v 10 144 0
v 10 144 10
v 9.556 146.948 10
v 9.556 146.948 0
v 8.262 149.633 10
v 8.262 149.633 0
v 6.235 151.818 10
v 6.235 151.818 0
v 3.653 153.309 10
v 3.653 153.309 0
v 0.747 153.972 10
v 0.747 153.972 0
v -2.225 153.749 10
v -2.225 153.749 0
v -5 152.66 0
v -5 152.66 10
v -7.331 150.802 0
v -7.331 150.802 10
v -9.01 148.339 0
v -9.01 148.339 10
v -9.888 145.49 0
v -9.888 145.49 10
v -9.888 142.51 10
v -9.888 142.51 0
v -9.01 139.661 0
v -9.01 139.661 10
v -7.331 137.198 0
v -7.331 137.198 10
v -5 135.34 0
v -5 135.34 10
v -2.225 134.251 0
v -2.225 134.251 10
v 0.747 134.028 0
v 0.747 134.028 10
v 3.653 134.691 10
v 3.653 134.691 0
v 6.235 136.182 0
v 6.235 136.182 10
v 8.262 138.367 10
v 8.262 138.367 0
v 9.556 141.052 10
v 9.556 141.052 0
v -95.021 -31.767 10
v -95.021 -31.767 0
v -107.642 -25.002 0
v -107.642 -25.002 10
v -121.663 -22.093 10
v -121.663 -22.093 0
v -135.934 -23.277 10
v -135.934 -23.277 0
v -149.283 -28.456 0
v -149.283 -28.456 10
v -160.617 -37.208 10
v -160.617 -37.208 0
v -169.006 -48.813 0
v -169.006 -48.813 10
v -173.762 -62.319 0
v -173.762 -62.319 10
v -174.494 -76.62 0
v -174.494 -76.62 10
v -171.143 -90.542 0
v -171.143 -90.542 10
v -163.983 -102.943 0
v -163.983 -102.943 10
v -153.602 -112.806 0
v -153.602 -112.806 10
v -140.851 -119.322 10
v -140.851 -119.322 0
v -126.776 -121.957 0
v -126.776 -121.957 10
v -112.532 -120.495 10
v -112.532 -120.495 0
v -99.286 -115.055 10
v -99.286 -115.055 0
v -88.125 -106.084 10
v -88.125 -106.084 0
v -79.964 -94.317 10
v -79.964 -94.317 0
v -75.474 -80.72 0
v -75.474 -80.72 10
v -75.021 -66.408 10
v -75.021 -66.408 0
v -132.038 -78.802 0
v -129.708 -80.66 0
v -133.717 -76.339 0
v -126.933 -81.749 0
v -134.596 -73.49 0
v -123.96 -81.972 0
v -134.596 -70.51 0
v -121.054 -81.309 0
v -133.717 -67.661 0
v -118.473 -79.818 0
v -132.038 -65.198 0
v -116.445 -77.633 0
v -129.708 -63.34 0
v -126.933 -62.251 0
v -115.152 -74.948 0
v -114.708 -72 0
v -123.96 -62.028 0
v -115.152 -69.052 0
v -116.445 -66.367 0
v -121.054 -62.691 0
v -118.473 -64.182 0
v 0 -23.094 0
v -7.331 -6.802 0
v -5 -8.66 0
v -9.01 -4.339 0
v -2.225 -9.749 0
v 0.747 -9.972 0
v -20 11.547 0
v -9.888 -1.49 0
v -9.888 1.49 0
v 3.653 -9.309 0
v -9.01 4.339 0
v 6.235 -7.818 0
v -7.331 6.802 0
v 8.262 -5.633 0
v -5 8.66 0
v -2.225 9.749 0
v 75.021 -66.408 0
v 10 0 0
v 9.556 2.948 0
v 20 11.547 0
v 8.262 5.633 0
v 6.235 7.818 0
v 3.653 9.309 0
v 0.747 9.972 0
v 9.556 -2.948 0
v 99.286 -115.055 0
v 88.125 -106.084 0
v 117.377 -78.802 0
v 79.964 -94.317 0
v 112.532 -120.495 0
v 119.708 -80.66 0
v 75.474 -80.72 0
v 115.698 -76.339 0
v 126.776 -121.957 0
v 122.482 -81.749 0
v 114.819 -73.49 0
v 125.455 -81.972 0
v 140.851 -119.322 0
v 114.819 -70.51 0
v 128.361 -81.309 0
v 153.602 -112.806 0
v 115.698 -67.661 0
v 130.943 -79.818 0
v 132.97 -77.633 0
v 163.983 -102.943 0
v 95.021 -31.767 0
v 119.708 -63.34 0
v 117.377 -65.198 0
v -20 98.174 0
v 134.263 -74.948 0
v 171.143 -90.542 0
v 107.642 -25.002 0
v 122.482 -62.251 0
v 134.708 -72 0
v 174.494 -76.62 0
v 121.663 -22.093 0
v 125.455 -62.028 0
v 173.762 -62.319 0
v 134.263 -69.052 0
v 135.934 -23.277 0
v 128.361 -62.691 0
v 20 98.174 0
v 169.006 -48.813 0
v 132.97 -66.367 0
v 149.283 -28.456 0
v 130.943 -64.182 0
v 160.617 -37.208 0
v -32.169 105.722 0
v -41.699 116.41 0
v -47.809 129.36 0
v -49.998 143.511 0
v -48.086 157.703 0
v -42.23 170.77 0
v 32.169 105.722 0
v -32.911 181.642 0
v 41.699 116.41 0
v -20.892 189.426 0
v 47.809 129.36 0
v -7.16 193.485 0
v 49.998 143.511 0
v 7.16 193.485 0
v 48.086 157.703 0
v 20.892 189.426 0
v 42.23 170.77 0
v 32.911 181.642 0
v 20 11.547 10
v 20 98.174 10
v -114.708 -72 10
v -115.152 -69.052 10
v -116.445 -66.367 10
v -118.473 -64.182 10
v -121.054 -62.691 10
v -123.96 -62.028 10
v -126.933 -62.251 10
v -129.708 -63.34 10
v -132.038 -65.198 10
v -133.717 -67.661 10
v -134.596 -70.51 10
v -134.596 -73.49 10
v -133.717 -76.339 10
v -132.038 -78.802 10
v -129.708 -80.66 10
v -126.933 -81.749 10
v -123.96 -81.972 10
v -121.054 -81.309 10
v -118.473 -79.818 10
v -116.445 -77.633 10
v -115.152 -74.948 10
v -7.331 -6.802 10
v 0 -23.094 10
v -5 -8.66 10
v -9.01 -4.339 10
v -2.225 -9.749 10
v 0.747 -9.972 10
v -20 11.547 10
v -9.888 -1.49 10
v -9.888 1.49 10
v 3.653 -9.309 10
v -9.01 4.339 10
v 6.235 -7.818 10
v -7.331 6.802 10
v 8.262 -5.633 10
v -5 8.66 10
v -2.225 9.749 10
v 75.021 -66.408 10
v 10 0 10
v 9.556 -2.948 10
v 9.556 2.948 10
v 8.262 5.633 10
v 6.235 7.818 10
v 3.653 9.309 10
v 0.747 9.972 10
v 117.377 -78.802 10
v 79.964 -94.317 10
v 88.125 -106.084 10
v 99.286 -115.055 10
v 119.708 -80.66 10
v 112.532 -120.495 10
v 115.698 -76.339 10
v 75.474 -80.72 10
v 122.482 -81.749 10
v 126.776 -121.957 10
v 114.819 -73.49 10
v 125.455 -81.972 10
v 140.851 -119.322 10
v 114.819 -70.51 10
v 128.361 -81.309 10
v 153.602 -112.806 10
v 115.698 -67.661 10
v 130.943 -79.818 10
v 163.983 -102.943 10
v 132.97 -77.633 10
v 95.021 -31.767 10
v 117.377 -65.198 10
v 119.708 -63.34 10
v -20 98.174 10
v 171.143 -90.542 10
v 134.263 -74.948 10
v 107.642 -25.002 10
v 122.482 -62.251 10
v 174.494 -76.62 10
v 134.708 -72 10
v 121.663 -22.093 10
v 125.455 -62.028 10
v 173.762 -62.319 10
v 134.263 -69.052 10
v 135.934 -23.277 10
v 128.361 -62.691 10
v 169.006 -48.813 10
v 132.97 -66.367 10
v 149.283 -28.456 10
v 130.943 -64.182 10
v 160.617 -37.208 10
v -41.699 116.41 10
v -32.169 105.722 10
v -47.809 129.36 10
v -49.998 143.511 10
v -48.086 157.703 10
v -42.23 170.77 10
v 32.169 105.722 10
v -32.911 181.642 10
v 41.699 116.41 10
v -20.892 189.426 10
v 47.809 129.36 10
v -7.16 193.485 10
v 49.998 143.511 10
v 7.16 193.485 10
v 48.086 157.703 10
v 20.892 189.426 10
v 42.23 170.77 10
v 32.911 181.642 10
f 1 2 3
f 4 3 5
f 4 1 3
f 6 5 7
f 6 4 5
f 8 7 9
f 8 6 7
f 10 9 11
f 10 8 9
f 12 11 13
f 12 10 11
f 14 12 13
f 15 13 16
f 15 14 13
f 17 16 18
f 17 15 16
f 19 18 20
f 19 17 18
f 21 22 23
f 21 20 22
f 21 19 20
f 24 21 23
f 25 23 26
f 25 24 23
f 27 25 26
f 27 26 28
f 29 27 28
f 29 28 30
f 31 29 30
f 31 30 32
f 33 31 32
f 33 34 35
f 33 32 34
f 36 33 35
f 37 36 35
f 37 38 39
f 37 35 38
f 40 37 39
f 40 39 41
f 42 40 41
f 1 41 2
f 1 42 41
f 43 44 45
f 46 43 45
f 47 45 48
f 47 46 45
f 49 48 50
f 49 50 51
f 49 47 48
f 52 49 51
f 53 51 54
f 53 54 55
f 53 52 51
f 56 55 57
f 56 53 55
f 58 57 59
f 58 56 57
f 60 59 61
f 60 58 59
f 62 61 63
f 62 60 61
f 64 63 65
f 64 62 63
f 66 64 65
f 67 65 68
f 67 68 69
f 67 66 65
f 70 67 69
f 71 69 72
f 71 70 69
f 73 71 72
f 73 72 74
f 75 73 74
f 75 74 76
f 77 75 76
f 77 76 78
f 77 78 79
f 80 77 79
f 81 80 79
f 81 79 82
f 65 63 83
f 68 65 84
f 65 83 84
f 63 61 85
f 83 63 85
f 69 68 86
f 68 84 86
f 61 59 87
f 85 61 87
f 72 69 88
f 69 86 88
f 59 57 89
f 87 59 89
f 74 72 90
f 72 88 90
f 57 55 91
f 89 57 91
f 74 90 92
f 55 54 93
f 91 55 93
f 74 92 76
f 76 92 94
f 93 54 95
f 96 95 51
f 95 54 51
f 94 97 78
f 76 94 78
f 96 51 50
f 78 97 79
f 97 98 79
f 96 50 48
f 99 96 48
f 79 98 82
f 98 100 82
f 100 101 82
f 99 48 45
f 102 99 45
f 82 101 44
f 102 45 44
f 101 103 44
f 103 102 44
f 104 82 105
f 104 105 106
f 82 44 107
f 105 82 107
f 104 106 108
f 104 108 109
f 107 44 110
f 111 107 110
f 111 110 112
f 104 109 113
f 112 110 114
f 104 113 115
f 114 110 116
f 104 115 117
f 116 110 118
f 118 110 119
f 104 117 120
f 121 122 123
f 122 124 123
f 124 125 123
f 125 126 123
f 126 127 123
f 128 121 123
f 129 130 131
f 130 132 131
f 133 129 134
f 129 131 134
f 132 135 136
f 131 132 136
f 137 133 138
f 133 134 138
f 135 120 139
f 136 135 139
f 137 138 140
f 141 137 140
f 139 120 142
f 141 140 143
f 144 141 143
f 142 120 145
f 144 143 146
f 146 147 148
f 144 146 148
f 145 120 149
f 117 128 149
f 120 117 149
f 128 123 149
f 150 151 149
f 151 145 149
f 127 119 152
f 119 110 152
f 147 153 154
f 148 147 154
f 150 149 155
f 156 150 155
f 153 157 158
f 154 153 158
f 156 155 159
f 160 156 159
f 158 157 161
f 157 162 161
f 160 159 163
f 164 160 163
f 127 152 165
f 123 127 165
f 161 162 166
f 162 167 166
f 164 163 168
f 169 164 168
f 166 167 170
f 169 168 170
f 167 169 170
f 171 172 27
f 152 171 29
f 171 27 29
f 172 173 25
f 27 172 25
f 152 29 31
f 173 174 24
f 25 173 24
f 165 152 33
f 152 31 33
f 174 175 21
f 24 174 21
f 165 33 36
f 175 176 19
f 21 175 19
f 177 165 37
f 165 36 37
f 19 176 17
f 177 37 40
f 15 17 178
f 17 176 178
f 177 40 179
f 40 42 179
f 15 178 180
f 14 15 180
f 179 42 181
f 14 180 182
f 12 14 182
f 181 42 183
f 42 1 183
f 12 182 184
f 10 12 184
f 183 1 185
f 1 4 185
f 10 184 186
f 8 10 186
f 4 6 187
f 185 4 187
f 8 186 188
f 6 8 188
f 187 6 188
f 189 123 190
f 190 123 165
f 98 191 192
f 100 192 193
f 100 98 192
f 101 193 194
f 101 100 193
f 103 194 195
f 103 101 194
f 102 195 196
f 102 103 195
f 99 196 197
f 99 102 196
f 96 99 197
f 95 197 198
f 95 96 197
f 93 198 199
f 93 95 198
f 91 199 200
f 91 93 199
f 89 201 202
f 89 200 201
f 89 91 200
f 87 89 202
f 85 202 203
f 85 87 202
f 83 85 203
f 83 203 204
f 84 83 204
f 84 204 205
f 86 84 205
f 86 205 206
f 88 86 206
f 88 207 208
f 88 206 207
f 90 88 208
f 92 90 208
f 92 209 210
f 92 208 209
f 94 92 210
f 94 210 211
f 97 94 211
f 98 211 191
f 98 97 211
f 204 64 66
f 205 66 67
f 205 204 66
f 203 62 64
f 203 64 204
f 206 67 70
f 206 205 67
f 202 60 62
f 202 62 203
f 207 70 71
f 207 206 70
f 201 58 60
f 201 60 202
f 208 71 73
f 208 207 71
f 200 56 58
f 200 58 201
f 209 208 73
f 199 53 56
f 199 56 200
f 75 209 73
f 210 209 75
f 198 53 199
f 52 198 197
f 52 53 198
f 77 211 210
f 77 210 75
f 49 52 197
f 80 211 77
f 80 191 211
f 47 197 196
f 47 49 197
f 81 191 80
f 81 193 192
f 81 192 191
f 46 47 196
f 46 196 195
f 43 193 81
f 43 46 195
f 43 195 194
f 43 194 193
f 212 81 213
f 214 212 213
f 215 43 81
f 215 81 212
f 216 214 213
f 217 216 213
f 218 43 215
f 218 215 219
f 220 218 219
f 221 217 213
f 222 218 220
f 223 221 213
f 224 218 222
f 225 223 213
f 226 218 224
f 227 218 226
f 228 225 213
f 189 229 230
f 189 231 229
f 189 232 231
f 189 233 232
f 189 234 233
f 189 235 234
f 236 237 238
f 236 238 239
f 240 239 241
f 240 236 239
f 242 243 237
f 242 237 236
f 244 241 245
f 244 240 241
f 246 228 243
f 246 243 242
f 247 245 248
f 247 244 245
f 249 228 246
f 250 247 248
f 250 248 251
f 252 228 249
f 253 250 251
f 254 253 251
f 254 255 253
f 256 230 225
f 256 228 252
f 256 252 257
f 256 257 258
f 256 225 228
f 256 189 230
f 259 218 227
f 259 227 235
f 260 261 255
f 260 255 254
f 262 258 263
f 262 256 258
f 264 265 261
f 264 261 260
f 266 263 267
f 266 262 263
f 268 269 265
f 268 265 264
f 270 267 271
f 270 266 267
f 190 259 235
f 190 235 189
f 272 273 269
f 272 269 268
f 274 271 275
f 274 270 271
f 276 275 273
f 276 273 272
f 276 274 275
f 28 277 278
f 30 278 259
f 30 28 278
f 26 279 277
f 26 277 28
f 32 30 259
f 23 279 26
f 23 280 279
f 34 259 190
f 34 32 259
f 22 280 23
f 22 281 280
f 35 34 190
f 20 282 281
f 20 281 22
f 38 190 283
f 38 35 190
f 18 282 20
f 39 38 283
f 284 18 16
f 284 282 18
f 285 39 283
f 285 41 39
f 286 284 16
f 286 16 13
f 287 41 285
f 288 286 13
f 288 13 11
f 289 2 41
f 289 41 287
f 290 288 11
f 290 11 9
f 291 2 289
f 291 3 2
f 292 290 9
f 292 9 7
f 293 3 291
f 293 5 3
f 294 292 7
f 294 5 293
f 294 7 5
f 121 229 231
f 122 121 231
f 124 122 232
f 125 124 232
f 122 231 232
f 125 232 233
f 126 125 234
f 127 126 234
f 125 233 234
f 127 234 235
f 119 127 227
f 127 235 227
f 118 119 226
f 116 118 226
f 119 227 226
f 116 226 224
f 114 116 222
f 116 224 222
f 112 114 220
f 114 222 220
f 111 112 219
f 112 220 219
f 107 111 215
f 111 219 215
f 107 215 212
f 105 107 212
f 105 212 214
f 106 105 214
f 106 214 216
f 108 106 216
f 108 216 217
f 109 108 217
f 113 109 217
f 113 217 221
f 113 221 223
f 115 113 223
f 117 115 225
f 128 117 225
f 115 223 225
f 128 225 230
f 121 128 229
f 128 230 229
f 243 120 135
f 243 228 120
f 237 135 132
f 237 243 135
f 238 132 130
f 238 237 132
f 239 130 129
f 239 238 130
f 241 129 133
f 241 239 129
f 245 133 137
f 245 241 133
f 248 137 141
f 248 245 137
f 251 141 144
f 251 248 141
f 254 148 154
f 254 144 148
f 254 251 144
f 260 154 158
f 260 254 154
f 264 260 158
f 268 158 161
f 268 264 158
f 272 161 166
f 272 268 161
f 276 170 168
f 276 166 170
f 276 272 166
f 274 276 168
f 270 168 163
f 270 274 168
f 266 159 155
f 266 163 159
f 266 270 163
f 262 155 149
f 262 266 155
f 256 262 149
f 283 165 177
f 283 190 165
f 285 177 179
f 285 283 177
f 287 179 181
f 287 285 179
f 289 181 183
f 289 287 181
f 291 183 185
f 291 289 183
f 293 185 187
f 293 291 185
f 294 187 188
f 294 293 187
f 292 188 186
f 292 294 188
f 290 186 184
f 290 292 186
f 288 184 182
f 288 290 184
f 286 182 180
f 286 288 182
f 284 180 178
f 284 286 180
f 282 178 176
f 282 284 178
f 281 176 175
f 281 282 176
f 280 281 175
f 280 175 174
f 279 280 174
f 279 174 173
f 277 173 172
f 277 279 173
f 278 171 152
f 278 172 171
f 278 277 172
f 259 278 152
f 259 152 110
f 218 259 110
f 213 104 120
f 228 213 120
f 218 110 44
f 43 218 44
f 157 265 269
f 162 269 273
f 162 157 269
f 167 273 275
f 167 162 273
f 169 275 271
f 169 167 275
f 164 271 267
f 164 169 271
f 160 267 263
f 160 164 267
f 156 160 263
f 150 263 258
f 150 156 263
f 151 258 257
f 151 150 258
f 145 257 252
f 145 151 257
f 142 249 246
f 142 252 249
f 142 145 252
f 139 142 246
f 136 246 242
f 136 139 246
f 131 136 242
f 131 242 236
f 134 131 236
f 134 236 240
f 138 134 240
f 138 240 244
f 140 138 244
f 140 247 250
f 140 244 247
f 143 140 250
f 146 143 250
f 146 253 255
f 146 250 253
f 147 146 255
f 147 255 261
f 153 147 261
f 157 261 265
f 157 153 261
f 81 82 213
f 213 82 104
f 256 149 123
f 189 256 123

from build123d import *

# Parameters (mm, degrees)
BOSS_EXTRUDE2_DEPTH = 10
SKETCH3_R           = 50
BOSS_EXTRUDE3_DEPTH = 10
SKETCH4_R           = 10
BOSS_EXTRUDE4_DEPTH = 90
CUT_EXTRUDE1_START  = -30
SKETCH5_R           = 10
CUT_EXTRUDE1_DEPTH  = 30
SKETCH6_R           = 13
CUT_EXTRUDE2_DEPTH  = 10
SKETCH7_R           = 10
BOSS_EXTRUDE5_DEPTH = 30
SKETCH8_R           = 20.369169003
BOSS_EXTRUDE6_DEPTH = 10
CUT_EXTRUDE3_START  = -100
SKETCH9_R           = 10
CUT_EXTRUDE3_DEPTH  = 100
SKETCH10_R          = 10
CUT_EXTRUDE4_DEPTH  = 10


with BuildPart() as part:
    # Sketch1 → Boss-Extrude2 (new body)
    with BuildSketch(Plane.XY):
        Polygon((20, 144), (-20, 144), (-20, 11.547005384), (-134.707658145, -54.679491924), (-114.707658145, -89.320508076), (0, -23.094010768), (114.707658145, -89.320508076), (134.707658145, -54.679491924), (20, 11.547005384), align=None)
    extrude(amount=BOSS_EXTRUDE2_DEPTH)

    # Sketch3 → Boss-Extrude3 (add)
    with BuildSketch(Plane.XY.offset(10)):
        with Locations((-124.707658145, -72)):
            Circle(SKETCH3_R)
        with Locations((0, 144)):
            Circle(SKETCH3_R)
        with Locations((124.707658145, -72)):
            Circle(SKETCH3_R)
    extrude(amount=-BOSS_EXTRUDE3_DEPTH)

    # Sketch4 → Boss-Extrude4 (add)
    with BuildSketch(Plane.XY.offset(10)):
        with Locations(Location((0, 144, 0), (0, 0, 180))):
            Circle(SKETCH4_R)
        with Locations(Location((124.707658145, -72, 0), (0, 0, 180))):
            Circle(SKETCH4_R)
        with Locations(Location((-124.707658145, -72, 0), (0, 0, 180))):
            Circle(SKETCH4_R)
    extrude(amount=BOSS_EXTRUDE4_DEPTH)

    # Sketch5 → Cut-Extrude1 (cut)
    with BuildSketch(Plane.XY.offset(100).offset(CUT_EXTRUDE1_START)):
        with Locations(Location((0, 144, 0), (0, 0, 180))):
            Circle(SKETCH5_R)
    extrude(amount=CUT_EXTRUDE1_DEPTH, mode=Mode.SUBTRACT)

    # Sketch6 → Cut-Extrude2 (cut)
    with BuildSketch(Plane.XY.offset(10)):
        Circle(SKETCH6_R)
    extrude(amount=-CUT_EXTRUDE2_DEPTH, mode=Mode.SUBTRACT)

    # Sketch7 → Boss-Extrude5 (add)
    with BuildSketch(Plane.XY.offset(70)):
        with Locations(Location((0, 144, 0), (0, 0, 180))):
            Circle(SKETCH7_R)
    extrude(amount=BOSS_EXTRUDE5_DEPTH)

    # Sketch8 → Boss-Extrude6 (add)
    with BuildSketch(Plane.XY.offset(10)):
        Circle(SKETCH8_R)
    extrude(amount=-BOSS_EXTRUDE6_DEPTH)

    # Sketch9 → Cut-Extrude3 (cut)
    with BuildSketch(Plane.XY.offset(100).offset(CUT_EXTRUDE3_START)):
        with Locations((-124.707658145, -72)):
            Circle(SKETCH9_R)
        with Locations((0, 144)):
            Circle(SKETCH9_R)
        with Locations((124.707658145, -72)):
            Circle(SKETCH9_R)
    extrude(amount=CUT_EXTRUDE3_DEPTH, mode=Mode.SUBTRACT)

    # Sketch10 → Cut-Extrude4 (cut)
    with BuildSketch(Plane.XY.offset(10)):
        Circle(SKETCH10_R)
    extrude(amount=-CUT_EXTRUDE4_DEPTH, mode=Mode.SUBTRACT)


solid = part.part
